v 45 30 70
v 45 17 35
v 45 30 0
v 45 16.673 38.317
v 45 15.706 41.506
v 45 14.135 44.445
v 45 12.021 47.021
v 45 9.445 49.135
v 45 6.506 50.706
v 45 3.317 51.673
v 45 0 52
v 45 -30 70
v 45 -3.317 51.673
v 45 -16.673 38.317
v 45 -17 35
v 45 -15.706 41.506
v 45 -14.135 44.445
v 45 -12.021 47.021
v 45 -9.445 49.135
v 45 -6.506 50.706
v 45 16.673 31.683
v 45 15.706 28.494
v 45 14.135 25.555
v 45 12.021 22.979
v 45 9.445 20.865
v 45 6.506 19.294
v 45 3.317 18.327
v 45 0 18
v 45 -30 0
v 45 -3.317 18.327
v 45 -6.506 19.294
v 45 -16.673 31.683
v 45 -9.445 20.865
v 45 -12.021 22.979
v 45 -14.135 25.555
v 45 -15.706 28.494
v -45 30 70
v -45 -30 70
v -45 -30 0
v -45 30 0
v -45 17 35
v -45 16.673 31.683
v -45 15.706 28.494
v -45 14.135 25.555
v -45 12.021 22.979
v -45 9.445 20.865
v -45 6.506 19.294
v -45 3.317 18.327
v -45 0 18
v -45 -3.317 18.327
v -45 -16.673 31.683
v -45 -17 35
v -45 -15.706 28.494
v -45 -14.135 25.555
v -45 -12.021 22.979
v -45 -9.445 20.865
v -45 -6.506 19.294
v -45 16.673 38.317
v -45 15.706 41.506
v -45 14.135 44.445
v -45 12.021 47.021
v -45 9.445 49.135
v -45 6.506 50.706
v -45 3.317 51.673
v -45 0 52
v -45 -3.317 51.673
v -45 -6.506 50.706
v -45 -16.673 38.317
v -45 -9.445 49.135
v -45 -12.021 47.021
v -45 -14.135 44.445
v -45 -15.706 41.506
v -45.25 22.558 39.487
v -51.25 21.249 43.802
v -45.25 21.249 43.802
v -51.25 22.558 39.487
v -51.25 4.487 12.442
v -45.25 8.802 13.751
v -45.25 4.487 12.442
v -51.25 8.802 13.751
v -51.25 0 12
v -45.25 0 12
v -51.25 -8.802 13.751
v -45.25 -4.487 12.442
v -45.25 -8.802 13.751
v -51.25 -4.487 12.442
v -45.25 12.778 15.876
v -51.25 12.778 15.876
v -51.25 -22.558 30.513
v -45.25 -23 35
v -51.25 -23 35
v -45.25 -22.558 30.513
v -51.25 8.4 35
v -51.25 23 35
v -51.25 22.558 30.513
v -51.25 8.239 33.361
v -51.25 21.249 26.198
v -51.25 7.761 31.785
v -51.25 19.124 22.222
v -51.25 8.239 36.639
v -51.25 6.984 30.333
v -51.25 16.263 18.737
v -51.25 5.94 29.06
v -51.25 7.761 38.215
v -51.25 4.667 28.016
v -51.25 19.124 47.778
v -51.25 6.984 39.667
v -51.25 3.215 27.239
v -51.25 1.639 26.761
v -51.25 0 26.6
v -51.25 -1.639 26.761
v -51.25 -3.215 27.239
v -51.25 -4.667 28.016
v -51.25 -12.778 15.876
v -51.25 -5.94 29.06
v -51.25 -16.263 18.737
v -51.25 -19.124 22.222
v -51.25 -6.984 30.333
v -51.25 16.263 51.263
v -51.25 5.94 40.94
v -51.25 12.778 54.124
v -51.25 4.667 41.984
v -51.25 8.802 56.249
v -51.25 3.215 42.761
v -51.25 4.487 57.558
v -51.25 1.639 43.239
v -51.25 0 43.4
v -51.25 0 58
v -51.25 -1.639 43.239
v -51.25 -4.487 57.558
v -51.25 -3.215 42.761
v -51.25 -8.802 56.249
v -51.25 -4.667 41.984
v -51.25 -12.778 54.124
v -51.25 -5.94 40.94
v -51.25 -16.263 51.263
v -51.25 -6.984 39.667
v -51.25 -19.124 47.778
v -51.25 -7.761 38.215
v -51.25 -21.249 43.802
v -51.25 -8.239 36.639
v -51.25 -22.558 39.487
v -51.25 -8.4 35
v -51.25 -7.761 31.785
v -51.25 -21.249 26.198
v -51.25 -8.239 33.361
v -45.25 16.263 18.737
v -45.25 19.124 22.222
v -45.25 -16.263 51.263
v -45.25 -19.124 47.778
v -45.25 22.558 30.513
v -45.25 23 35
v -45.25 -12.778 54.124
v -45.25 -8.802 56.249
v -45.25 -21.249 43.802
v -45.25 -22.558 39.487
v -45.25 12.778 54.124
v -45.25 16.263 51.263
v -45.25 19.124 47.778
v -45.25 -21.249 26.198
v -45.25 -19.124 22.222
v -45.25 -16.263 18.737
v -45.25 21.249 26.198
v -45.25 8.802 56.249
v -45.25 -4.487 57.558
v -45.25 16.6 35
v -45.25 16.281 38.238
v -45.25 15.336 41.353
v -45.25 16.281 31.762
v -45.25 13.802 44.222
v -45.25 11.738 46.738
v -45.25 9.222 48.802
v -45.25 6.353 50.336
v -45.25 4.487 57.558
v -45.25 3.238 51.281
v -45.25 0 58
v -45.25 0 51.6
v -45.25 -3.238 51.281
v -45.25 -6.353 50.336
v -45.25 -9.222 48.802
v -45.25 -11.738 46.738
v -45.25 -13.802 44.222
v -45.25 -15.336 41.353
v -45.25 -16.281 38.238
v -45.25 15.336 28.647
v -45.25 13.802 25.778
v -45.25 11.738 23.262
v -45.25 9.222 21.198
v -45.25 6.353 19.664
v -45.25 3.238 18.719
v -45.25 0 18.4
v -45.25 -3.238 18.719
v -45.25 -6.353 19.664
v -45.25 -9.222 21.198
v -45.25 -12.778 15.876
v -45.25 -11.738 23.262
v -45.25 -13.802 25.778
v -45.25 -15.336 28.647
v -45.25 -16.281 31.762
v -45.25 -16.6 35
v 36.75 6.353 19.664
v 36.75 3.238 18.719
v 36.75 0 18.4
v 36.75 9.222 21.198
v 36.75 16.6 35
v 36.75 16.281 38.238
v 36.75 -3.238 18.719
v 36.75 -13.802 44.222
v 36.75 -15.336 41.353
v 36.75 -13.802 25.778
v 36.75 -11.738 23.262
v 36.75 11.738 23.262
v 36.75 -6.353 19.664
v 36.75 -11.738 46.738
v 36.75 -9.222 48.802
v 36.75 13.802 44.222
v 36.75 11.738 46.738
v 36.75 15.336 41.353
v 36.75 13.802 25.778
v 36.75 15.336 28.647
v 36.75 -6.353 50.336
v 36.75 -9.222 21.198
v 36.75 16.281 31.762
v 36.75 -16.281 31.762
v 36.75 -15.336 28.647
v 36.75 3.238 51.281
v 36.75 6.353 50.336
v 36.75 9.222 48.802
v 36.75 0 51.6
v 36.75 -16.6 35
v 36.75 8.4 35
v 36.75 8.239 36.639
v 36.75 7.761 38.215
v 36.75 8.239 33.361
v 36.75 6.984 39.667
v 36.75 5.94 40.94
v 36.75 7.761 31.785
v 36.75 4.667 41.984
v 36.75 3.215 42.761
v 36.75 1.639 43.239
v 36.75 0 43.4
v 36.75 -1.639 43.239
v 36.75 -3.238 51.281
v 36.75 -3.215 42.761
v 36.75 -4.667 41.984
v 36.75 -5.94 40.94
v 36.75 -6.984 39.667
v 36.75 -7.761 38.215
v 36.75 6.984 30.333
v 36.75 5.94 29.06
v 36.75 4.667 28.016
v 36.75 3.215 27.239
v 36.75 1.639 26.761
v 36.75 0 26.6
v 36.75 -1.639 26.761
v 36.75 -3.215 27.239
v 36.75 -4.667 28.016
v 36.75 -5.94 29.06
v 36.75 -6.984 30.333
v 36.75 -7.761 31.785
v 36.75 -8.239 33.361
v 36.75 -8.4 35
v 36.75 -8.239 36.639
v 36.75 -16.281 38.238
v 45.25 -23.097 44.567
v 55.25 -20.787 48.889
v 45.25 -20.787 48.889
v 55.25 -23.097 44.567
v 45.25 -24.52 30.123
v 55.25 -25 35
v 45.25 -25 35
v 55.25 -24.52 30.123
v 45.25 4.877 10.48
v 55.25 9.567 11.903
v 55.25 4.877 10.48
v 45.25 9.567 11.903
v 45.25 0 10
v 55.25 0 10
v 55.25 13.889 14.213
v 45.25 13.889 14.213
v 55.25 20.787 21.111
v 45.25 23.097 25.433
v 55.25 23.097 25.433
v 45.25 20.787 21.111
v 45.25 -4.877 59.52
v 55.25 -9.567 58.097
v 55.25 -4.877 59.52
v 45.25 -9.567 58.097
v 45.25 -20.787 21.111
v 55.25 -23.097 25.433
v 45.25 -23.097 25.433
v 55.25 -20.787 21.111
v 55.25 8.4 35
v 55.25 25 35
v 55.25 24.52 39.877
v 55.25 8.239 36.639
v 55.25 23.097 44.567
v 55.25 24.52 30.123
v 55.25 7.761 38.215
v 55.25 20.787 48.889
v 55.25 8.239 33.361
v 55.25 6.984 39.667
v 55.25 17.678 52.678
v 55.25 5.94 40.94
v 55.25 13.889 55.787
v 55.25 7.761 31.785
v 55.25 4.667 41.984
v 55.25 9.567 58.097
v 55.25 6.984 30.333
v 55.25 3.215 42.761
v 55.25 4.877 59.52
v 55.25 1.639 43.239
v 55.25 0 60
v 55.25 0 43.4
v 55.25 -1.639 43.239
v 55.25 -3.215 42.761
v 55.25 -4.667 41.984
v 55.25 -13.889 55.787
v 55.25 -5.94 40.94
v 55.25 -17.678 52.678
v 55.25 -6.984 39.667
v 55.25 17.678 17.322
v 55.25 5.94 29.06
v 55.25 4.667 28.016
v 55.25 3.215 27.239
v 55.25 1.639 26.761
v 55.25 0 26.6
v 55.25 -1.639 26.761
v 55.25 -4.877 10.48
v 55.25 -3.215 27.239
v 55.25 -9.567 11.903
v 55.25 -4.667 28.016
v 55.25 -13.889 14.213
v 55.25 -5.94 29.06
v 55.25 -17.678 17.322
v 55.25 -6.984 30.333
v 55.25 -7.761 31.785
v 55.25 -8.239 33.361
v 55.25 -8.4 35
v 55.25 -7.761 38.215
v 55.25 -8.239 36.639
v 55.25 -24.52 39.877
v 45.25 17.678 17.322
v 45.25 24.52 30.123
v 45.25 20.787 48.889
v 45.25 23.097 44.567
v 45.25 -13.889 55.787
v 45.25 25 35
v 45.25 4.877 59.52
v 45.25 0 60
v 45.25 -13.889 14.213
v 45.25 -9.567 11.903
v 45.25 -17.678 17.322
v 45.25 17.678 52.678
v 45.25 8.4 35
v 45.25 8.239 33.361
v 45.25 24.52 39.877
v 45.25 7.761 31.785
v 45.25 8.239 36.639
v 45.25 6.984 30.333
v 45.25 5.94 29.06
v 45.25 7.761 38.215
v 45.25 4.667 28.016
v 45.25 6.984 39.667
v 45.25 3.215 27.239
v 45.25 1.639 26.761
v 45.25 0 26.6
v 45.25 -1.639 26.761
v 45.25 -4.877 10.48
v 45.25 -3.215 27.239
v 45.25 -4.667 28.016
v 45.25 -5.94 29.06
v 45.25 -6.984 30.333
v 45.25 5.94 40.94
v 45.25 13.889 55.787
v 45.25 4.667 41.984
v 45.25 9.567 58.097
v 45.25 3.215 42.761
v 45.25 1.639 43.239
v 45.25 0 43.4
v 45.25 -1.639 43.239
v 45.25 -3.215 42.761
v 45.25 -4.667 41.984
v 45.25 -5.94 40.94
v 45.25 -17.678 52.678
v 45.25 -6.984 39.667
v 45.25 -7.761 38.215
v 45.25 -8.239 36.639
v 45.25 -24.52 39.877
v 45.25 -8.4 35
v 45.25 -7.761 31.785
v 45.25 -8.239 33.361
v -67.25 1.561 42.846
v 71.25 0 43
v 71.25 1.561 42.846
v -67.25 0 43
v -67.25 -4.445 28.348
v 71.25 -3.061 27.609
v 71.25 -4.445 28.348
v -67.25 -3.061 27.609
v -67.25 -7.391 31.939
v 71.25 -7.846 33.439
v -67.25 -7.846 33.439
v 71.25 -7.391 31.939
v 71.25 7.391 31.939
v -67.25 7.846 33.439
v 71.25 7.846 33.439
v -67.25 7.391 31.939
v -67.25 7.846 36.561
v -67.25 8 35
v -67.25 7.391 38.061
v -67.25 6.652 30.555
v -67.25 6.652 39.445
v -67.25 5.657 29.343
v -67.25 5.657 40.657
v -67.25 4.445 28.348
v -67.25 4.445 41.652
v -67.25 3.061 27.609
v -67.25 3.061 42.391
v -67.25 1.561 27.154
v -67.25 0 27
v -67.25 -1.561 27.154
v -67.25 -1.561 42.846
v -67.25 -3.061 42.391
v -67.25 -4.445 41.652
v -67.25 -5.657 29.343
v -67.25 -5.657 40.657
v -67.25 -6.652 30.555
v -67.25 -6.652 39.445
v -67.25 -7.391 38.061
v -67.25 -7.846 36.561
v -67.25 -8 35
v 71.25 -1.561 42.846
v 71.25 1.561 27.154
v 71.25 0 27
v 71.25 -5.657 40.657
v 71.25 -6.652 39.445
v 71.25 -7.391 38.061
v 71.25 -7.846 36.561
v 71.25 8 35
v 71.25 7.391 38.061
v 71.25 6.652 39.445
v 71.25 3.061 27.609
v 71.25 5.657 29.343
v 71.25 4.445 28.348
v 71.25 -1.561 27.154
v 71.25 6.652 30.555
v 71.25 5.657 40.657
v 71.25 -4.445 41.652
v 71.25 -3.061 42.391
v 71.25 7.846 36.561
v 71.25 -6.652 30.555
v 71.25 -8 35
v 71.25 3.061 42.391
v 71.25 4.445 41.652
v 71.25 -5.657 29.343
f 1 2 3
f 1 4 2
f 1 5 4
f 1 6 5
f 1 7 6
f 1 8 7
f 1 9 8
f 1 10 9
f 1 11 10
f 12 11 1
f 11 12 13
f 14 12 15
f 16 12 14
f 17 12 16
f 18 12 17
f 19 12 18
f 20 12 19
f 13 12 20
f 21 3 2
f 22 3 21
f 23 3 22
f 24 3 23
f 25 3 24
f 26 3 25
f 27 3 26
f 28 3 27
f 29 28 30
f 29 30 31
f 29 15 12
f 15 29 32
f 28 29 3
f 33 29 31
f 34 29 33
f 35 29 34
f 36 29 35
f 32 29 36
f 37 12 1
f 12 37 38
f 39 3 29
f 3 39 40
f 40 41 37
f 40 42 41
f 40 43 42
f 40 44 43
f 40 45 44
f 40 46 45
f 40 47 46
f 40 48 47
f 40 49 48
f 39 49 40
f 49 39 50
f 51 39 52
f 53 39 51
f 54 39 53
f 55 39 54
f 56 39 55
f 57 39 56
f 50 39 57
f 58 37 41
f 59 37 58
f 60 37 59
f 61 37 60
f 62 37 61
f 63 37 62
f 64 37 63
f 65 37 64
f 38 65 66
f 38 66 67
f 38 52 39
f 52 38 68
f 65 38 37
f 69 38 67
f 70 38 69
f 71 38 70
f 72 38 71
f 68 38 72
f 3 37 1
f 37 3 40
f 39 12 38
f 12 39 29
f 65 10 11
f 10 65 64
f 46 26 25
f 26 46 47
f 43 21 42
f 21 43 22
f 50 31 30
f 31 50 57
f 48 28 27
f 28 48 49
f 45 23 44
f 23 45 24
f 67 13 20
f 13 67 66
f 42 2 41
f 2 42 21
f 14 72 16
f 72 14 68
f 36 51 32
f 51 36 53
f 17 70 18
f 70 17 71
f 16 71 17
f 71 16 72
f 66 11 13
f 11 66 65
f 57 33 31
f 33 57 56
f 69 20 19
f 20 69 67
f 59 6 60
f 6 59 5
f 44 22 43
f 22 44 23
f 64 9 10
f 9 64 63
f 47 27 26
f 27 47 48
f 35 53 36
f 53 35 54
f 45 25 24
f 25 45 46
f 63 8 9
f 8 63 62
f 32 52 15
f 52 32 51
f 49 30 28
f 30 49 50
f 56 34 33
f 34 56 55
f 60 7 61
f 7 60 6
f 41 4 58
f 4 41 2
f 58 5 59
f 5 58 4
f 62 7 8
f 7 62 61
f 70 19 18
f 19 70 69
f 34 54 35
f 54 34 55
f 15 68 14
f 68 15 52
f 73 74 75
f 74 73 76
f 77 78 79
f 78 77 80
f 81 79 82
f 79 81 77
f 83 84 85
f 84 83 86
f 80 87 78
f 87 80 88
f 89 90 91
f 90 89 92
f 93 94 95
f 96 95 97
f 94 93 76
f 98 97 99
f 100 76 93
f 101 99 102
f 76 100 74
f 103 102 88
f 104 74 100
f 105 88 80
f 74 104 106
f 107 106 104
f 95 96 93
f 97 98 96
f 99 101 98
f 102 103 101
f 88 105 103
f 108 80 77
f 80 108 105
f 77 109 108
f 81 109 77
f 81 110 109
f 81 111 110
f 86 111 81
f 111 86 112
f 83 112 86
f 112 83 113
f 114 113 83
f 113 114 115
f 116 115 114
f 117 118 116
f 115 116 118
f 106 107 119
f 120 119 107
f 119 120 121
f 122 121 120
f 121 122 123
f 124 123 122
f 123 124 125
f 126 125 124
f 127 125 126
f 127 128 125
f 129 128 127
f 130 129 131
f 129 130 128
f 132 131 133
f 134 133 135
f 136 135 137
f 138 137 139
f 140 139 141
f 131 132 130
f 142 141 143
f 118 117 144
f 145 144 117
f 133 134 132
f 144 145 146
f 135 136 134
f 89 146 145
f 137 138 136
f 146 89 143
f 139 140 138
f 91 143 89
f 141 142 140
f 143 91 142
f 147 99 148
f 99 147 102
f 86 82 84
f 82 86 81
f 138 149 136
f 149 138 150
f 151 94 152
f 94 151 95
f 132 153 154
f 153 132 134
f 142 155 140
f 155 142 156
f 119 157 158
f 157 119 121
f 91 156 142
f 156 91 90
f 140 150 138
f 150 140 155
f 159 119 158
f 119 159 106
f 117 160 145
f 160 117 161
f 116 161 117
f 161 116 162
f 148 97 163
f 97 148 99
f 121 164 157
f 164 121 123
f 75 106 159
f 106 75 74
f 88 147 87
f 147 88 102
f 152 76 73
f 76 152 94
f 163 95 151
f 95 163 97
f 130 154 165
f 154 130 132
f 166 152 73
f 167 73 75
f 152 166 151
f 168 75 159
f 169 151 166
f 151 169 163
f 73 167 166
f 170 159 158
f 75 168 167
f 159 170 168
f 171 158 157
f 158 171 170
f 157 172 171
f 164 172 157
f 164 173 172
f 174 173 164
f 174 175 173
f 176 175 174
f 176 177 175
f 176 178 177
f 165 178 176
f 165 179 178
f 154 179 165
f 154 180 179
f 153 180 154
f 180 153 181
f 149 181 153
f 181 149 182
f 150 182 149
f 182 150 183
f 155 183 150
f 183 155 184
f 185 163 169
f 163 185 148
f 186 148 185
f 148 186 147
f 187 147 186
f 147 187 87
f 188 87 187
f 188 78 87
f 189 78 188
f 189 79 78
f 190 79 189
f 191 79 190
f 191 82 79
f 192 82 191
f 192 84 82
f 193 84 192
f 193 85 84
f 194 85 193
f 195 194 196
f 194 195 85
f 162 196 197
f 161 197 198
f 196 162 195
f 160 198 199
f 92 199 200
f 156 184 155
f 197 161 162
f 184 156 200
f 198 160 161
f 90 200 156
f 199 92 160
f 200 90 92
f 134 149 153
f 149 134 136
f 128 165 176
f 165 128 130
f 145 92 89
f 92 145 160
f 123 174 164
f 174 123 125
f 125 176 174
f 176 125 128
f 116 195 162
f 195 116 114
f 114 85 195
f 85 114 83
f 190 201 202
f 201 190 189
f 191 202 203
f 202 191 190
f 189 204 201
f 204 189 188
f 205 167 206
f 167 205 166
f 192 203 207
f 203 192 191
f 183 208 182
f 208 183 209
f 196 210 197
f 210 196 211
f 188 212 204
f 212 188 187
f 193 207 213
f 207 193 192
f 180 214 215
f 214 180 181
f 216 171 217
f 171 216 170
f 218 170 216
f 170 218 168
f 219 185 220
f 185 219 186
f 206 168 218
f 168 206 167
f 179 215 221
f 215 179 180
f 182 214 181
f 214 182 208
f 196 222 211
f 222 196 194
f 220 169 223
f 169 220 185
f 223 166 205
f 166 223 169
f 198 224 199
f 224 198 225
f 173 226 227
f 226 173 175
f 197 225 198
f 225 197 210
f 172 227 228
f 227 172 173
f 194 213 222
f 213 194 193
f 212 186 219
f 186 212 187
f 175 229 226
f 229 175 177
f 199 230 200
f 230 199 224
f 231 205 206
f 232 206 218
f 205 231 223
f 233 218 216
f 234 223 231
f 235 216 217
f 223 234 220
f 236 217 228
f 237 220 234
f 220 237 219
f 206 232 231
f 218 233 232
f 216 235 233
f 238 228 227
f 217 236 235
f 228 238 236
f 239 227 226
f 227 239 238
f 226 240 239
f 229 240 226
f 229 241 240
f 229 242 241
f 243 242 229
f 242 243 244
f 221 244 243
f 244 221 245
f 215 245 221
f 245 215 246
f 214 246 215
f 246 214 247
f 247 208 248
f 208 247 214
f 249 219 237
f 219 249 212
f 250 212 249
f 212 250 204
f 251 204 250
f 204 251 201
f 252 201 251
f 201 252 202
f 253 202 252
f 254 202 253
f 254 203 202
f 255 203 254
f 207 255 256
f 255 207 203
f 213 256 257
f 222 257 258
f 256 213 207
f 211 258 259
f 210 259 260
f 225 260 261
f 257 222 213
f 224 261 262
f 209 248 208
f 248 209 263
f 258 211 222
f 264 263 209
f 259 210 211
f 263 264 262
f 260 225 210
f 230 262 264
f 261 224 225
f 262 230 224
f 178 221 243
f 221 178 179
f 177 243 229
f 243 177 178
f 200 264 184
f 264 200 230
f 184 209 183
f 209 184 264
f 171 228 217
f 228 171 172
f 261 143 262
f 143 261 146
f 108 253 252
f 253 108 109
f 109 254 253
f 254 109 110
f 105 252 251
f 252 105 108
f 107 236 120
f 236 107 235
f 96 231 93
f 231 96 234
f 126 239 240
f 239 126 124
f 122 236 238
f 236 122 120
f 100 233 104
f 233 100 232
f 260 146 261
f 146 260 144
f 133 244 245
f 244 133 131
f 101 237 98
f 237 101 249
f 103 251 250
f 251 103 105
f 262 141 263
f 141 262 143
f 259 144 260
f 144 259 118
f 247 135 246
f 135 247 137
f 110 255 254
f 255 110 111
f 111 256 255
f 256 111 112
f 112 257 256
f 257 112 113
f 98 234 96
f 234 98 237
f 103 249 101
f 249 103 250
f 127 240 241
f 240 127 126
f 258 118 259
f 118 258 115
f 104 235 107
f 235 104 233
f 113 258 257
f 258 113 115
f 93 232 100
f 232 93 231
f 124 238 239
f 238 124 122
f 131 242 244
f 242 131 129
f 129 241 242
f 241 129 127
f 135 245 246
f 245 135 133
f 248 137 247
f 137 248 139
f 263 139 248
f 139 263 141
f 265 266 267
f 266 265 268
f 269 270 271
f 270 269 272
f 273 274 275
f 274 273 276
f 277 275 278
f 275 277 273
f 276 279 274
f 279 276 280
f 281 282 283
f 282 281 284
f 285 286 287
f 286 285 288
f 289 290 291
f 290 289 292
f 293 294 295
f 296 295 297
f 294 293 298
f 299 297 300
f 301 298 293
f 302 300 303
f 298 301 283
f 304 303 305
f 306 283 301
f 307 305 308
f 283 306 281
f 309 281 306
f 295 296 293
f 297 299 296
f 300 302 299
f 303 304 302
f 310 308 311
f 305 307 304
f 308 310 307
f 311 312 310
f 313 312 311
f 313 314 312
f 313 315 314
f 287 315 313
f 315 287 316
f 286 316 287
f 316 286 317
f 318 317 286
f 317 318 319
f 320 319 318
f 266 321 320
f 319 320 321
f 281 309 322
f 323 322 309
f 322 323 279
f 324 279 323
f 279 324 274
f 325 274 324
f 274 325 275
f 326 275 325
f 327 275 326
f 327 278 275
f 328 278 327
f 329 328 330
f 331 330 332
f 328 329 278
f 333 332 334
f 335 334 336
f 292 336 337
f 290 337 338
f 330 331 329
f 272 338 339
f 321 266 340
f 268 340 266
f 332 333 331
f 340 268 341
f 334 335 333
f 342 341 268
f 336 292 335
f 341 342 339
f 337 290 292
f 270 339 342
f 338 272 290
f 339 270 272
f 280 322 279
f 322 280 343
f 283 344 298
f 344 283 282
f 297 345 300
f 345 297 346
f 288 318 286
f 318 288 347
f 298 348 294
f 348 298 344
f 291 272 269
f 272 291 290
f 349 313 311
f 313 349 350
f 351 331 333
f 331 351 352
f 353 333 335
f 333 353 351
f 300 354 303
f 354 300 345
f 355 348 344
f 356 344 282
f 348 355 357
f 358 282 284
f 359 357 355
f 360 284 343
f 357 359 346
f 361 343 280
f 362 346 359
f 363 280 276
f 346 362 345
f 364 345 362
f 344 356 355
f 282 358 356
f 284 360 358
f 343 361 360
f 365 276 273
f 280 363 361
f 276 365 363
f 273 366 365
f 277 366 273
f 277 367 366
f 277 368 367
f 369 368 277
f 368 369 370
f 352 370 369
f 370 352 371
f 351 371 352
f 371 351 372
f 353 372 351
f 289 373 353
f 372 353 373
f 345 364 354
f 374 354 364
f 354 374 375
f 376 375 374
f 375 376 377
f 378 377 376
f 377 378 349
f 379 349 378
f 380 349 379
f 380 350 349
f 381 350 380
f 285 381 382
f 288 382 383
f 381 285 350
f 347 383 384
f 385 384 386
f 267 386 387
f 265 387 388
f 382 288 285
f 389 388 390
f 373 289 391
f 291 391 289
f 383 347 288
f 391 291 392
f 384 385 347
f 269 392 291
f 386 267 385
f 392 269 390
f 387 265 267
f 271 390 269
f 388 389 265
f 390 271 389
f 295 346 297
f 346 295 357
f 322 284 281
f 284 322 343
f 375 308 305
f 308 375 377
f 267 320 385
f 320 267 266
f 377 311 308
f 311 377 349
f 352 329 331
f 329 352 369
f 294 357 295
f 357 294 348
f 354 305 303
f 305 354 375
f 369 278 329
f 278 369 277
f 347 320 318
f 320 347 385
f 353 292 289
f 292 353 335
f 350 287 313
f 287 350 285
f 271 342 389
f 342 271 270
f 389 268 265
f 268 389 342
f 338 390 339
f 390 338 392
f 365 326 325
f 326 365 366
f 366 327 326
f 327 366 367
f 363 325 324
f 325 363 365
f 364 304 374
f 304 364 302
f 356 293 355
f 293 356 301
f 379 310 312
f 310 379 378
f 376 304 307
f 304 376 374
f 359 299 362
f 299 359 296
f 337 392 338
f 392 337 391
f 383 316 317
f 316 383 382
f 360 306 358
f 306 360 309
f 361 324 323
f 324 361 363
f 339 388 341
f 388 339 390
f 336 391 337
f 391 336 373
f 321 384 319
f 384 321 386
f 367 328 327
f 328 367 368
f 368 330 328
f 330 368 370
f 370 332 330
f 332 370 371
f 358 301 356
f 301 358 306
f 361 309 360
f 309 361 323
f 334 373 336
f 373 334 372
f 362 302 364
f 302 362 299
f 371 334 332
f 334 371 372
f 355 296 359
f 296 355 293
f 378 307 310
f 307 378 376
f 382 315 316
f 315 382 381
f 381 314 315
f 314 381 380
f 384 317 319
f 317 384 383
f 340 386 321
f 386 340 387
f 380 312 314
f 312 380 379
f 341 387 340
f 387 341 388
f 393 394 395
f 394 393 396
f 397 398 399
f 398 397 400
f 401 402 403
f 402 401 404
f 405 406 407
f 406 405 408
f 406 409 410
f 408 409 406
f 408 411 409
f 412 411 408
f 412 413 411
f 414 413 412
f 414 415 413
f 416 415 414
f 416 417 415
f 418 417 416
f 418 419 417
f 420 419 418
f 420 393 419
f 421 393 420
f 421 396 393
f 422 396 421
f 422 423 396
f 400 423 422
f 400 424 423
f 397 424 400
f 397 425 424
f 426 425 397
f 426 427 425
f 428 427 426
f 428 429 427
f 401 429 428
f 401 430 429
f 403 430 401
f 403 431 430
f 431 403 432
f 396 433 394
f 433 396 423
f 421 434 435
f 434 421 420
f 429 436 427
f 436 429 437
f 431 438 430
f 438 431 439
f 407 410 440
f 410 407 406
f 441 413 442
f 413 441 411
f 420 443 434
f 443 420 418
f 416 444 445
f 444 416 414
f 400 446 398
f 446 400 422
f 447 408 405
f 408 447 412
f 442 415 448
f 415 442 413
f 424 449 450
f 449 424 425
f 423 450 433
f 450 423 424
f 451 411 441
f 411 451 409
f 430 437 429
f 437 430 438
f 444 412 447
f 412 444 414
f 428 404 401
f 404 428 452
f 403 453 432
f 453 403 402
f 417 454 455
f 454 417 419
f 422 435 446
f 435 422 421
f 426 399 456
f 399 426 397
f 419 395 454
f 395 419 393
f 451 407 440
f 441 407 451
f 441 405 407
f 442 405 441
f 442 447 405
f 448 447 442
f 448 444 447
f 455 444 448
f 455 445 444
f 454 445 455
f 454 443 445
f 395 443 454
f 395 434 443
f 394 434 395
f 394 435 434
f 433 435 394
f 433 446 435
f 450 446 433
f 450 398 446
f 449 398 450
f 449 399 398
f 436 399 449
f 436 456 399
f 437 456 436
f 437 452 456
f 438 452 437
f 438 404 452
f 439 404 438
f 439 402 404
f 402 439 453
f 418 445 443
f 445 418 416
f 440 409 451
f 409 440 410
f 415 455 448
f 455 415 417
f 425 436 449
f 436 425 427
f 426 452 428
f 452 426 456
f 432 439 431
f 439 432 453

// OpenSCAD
$fn = 32;

// ------------------------------------------------------------------------
// Bushed housing: 90 x 60 x 70 mm housing, bushing d33.2
// Every part is its own module, assembly() places them once.
// ------------------------------------------------------------------------

// --- part 1 ---
module housing() {
  difference() {
    translate([-45, -30, 0]) cube([90, 60, 70]);
    translate([0, 0, 35]) rotate([0, 90, 0]) cylinder(h = 92, d = 34, center = true);
  }
}

// --- part 2 ---
module bushing() {
  difference() {
    union() {
      cylinder(h = 6, d = 46);
      translate([0, 0, 6]) cylinder(h = 82, d = 33.2);
    }
    translate([0, 0, -1]) cylinder(h = 90, d = 16.8);
  }
}

// --- part 3 ---
module shaft() {
  translate([0, 0, -69.25]) cylinder(h = 138.5, d = 16);
}

// --- part 4 ---
module cover() {
  difference() {
    cylinder(h = 10, d = 50);
    translate([0, 0, -1]) cylinder(h = 12, d = 16.8);
  }
}

// --- assembly ---
module assembly() {
  translate([0, 0, 0]) rotate([0, 0, 0]) housing();
  translate([-51.25, 0, 35]) rotate([0, 90, 0]) bushing();
  translate([2, 0, 35]) rotate([0, 90, 0]) shaft();
  translate([45.25, 0, 35]) rotate([0, 90, 0]) cover();
}

assembly();
